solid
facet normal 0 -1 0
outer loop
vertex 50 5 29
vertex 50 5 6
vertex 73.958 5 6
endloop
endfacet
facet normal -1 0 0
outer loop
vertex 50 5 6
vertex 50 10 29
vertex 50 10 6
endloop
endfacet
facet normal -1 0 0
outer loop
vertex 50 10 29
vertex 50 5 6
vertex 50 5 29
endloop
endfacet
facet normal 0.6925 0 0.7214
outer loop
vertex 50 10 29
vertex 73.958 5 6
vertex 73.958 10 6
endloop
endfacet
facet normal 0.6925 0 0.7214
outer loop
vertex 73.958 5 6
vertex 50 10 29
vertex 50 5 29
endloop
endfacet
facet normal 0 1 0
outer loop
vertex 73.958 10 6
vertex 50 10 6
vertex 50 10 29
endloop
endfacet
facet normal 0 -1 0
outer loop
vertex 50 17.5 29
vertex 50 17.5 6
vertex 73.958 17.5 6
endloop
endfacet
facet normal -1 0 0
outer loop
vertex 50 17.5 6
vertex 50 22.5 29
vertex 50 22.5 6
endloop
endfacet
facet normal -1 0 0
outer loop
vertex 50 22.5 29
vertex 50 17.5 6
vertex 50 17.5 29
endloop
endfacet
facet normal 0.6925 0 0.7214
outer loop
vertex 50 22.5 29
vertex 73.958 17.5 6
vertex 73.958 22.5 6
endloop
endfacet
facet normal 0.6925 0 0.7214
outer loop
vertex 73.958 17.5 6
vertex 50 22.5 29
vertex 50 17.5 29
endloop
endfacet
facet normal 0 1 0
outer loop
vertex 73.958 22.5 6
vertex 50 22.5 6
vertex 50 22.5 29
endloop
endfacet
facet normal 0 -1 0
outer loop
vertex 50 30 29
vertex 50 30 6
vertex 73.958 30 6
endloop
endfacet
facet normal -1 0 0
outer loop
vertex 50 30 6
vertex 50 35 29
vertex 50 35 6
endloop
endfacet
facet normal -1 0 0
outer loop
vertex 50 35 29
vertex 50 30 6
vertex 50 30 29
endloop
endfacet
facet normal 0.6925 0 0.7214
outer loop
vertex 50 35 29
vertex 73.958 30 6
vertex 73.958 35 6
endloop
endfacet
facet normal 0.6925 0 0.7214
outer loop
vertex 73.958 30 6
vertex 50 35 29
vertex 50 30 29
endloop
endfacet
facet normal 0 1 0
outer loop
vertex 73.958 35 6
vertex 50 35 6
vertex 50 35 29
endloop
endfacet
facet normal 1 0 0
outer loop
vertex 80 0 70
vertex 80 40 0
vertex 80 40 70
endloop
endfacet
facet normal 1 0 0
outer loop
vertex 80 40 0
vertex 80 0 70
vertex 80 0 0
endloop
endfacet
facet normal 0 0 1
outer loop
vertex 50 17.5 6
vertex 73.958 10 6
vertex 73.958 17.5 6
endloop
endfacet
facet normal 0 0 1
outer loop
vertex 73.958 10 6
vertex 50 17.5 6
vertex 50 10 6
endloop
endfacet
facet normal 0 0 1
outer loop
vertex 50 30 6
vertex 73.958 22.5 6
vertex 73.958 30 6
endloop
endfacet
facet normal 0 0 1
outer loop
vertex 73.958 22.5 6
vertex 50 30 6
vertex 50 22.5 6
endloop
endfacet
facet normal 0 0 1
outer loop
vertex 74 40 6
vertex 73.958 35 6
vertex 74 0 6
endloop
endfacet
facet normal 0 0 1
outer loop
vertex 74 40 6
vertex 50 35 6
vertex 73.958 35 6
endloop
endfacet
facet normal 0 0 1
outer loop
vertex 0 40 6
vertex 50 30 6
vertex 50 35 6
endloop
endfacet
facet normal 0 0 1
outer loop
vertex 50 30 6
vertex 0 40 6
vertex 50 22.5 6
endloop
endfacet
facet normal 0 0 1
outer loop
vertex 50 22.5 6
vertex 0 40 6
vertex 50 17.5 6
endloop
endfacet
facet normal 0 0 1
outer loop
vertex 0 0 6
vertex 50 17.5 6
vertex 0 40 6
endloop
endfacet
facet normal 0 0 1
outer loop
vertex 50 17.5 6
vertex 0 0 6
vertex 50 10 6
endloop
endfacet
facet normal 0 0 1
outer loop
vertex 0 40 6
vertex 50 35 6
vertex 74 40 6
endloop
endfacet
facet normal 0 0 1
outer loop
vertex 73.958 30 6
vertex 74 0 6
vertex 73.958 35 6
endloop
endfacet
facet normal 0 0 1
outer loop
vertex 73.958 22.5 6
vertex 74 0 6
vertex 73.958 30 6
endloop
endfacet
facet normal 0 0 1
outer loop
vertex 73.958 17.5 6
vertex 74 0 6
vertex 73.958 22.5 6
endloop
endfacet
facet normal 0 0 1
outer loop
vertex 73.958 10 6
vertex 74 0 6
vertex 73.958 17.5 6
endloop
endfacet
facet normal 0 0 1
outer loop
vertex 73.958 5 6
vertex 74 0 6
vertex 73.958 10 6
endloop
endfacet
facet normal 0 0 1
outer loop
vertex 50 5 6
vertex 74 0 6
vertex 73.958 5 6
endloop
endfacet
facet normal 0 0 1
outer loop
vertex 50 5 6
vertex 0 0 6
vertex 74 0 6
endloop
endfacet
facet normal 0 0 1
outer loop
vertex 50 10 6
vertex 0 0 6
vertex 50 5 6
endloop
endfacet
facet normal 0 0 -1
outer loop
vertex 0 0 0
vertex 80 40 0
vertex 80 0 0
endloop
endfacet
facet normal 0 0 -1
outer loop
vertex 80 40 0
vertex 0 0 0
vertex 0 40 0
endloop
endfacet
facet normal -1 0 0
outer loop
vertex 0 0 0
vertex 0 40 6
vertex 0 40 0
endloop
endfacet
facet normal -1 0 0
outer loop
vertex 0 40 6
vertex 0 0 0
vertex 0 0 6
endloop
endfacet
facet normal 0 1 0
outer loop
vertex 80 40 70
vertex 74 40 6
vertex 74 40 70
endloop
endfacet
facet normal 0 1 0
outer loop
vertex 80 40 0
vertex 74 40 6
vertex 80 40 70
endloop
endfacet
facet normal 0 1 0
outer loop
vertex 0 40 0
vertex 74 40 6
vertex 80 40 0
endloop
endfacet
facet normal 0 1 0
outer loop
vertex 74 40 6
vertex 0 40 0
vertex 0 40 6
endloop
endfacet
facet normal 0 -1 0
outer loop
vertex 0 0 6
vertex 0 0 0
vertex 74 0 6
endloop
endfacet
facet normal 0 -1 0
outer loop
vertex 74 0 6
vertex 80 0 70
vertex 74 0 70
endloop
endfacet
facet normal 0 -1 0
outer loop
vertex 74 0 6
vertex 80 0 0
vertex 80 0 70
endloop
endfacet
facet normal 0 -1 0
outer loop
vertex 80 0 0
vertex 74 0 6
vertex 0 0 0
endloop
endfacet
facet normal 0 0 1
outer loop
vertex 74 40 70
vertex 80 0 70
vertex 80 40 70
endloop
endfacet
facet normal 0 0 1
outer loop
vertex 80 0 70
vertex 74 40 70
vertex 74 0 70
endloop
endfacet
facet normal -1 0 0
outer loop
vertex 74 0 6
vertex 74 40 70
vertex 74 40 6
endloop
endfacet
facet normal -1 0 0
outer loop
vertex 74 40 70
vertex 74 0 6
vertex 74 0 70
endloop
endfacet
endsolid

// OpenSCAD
$fn = 32;

// ----------------------------------------------------------------------
// Rib bracket: 3-gusset L bracket
// ----------------------------------------------------------------------

// --- parameters (mm) ---
base_l = 80;              // foot length, X
base_w = 40;              // foot width, Y
base_t = 6;               // foot thickness
plate_t = 6;              // upright plate thickness
plate_h = 70;             // overall height
gus_l = 24;               // gusset leg along the foot
gus_h = 24;               // gusset height
gus_t = 5;                // gusset thickness
gus_edge = 5;             // gusset margin from the foot edge
n_gus = 3;                // gusset count

gus_pitch = (base_w - 2 * gus_edge - gus_t) / (n_gus - 1);  // gusset pitch

union() {
  cube([base_l, base_w, base_t]);
  translate([base_l - plate_t, 0, base_t - 1])
    cube([plate_t, base_w, plate_h - base_t + 1]);
  for (i = [0 : n_gus - 1])
    translate([base_l - plate_t - gus_l, gus_edge + i * gus_pitch, base_t - 1])
      rotate([-90, 0, 0])
        linear_extrude(height = gus_t)
          polygon(points = [[0, 0], [gus_l + 1, 0], [0, -gus_h]]);
}
